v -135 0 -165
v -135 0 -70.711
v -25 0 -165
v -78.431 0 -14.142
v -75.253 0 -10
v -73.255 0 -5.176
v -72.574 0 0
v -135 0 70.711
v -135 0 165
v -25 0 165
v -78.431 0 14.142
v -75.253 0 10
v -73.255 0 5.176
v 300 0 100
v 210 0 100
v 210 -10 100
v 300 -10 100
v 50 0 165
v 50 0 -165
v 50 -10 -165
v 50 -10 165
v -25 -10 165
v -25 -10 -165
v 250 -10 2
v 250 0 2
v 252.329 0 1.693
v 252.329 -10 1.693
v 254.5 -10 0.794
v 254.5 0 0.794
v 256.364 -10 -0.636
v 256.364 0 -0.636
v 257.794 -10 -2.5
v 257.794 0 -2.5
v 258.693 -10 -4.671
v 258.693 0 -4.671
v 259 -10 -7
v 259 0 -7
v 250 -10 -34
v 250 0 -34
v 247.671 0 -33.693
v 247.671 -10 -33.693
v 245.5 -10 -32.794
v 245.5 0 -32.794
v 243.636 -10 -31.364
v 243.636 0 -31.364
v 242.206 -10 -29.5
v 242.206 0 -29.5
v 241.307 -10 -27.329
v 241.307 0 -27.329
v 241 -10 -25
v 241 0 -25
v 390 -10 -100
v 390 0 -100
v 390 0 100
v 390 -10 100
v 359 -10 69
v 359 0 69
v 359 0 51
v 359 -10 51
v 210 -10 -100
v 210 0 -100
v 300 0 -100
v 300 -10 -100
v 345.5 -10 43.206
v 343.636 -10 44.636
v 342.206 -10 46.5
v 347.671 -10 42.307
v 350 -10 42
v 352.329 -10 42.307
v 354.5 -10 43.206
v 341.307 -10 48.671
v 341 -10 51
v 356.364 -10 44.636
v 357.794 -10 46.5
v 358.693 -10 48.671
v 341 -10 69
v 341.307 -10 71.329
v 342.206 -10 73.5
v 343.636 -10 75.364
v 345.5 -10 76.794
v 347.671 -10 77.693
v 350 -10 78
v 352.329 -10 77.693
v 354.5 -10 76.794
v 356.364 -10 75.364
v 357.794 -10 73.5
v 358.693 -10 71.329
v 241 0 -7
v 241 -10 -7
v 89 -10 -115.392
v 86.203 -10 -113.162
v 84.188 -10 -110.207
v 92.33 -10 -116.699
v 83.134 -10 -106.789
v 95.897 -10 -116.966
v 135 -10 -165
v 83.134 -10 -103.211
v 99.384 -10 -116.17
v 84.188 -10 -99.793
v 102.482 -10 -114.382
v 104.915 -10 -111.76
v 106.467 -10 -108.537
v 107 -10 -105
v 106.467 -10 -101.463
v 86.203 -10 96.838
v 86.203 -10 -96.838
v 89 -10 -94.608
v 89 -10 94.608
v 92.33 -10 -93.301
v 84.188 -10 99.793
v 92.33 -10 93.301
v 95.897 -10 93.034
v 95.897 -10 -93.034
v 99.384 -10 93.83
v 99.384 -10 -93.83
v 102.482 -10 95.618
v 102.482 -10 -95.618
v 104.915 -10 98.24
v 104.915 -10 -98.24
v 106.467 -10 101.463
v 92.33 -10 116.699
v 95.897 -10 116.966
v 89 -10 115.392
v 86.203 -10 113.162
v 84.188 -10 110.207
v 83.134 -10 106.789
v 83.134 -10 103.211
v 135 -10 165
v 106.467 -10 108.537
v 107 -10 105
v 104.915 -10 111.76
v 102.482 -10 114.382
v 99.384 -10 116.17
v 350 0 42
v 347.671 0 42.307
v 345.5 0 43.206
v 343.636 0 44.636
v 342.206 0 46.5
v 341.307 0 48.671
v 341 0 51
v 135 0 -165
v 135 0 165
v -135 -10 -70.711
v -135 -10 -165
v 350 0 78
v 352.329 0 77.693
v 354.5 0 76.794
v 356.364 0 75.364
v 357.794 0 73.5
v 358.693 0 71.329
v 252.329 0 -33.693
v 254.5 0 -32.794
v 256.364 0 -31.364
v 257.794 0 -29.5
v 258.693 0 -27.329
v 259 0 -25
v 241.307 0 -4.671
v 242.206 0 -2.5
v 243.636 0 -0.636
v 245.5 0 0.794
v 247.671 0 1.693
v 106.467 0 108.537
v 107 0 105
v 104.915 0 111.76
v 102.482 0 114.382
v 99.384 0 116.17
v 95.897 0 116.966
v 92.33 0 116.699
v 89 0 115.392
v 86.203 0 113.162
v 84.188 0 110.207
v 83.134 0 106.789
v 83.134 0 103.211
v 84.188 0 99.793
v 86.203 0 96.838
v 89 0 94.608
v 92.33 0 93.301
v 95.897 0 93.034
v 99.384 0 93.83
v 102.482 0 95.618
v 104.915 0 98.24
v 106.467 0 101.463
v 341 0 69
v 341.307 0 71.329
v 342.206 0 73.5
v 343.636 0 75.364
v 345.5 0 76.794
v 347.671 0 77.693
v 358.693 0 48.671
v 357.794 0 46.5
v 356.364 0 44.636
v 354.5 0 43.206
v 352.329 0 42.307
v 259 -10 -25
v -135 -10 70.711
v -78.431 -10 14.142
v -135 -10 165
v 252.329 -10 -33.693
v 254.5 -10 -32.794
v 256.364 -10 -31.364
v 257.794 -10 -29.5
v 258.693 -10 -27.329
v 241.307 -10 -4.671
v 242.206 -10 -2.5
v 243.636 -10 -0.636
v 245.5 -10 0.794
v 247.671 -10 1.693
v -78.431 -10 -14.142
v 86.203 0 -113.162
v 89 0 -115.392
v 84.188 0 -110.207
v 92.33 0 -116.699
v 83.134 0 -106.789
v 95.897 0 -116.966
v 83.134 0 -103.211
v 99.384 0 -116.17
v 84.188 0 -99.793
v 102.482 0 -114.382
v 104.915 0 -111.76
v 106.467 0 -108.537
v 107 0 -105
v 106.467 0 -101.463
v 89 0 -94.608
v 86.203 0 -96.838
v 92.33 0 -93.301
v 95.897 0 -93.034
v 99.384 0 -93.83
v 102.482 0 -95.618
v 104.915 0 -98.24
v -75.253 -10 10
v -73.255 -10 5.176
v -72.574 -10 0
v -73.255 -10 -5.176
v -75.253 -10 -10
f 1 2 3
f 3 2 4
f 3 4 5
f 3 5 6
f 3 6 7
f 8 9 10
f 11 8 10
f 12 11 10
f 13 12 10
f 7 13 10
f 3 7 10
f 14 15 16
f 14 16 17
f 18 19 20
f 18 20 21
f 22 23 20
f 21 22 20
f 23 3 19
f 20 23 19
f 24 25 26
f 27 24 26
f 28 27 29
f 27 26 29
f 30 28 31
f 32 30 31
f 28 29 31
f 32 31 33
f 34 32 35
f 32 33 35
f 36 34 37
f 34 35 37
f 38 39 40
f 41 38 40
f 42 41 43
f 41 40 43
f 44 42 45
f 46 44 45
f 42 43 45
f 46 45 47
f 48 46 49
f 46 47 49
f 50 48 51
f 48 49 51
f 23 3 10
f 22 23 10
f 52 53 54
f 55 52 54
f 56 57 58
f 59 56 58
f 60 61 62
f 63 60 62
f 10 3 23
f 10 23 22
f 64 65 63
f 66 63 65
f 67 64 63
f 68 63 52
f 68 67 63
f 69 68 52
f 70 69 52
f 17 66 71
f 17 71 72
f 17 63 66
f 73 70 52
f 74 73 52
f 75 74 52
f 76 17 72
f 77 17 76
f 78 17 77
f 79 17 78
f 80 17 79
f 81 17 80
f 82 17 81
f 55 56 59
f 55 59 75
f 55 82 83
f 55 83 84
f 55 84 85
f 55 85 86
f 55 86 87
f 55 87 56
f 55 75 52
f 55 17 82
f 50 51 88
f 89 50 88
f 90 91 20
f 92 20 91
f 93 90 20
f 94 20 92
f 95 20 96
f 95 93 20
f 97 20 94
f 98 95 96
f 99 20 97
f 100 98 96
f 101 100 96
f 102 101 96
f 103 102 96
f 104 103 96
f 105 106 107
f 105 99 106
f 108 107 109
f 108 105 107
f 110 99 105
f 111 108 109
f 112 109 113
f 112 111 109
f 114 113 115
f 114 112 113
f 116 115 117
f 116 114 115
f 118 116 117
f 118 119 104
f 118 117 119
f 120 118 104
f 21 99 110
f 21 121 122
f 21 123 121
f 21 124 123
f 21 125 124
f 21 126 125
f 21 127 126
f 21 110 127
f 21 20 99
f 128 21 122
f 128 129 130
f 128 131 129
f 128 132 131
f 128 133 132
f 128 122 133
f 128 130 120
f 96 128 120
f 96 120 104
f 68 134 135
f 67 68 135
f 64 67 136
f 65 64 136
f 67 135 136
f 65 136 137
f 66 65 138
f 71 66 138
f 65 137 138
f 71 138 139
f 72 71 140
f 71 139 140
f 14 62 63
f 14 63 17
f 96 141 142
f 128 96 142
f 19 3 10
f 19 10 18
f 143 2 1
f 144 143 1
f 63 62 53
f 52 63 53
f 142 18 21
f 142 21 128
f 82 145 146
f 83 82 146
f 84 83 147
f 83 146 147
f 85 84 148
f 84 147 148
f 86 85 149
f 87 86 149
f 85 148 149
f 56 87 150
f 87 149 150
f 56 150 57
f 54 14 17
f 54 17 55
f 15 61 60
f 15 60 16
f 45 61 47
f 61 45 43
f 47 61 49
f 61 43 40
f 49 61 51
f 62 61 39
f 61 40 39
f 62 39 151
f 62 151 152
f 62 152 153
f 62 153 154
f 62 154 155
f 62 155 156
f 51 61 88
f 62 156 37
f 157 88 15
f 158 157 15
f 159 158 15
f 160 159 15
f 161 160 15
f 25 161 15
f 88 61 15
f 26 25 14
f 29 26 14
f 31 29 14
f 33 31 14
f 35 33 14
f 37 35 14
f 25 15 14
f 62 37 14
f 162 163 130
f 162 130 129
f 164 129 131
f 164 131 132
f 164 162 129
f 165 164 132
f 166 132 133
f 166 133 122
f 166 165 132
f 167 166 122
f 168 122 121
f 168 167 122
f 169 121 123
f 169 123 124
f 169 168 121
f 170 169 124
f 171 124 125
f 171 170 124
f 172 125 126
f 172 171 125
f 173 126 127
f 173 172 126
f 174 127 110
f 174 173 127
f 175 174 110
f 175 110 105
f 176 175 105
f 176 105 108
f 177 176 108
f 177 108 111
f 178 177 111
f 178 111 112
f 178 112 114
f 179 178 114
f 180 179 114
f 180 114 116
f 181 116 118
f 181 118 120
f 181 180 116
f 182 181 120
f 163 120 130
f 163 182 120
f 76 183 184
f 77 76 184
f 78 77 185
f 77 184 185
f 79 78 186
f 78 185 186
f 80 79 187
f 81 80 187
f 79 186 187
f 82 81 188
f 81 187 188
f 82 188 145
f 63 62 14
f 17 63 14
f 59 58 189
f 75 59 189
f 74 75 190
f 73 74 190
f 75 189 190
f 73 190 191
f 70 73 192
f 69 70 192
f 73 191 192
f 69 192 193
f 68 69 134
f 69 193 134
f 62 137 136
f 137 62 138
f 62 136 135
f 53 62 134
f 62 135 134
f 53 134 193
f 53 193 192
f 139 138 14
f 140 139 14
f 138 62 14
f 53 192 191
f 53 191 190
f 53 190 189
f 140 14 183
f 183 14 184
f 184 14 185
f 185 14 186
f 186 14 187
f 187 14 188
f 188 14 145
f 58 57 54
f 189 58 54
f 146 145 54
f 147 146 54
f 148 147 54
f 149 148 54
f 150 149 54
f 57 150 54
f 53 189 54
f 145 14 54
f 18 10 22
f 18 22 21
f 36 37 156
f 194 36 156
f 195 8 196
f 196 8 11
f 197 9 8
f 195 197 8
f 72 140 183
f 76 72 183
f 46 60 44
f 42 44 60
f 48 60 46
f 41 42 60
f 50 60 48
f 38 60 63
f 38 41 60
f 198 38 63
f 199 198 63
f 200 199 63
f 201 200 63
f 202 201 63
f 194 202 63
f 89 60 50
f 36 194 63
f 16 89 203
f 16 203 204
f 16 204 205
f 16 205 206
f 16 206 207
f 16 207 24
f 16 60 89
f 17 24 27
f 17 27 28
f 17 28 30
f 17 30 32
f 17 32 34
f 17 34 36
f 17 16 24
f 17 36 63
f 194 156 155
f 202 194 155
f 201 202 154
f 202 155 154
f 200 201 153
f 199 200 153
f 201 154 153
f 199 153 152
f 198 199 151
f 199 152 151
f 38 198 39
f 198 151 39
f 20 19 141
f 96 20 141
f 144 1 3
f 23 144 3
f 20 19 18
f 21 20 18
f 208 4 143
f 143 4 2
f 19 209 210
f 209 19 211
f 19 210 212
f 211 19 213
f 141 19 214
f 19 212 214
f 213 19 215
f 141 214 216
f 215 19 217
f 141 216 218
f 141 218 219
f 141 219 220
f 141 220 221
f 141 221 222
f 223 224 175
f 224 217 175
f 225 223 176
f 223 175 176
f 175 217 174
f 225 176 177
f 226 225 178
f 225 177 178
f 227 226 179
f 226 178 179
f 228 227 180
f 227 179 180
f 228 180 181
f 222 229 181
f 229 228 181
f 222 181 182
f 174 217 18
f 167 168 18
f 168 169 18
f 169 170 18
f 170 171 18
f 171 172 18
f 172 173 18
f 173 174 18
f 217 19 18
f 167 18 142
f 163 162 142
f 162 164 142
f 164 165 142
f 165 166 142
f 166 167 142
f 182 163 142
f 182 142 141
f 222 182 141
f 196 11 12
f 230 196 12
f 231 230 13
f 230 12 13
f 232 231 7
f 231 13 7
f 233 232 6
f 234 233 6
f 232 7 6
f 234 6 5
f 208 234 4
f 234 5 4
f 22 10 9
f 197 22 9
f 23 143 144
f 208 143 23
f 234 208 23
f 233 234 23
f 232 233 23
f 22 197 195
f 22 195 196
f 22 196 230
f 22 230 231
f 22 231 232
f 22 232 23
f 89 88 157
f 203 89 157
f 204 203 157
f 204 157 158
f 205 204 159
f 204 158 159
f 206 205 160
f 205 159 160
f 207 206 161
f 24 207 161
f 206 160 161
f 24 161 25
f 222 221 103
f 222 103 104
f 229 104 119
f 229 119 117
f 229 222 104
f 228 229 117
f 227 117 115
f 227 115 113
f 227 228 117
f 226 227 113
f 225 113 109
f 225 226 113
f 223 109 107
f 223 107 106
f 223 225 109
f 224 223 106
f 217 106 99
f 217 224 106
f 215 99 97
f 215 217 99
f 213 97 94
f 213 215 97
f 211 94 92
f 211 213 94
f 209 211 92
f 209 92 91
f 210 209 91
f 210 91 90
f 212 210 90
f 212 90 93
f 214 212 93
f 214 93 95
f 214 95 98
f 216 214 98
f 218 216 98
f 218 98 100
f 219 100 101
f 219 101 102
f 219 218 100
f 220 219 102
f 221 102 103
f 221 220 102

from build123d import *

# Parameters (mm, degrees)
F0_W     = 90
F0_H     = 200
F1_DEPTH = 10
F0_W_2   = 85
F0_H_2   = 330
F0_R     = 12
F2_DEPTH = 10
F0_W_3   = 75
F3_DEPTH = 10


with BuildPart() as f1:
    # F0 (on Front) → F1 (new body)
    with BuildSketch(Plane.XZ):
        with BuildLine():
            Line((-25, -165), (-25, 165))
            Line((-25, 165), (-135, 165))
            Line((-135, 165), (-135, 70.710678))
            Line((-135, 70.710678), (-78.431458, 14.142136))
            ThreePointArc((-78.431458, 14.142136), (-72.573593, 0), (-78.431458, -14.142136))
            Line((-78.431458, -14.142136), (-135, -70.710678))
            Line((-135, -70.710678), (-135, -165))
            Line((-135, -165), (-25, -165))
        make_face()
        with Locations((255, 0)):
            Rectangle(F0_W, F0_H)
        Polygon((250, 2), (259, 2), (259, -7), (259, -25), (259, -34), (250, -34), (241, -34), (241, -25), (241, -7), (241, 2), align=None, mode=Mode.SUBTRACT)
        with BuildLine():
            Line((259, -34), (259, -25))
            ThreePointArc((259, -25), (256.363961, -31.363961), (250, -34))
            Line((250, -34), (259, -34))
        make_face()
        with BuildLine():
            Line((259, -7), (259, 2))
            Line((259, 2), (250, 2))
            ThreePointArc((250, 2), (256.363961, -0.636039), (259, -7))
        make_face()
        with BuildLine():
            ThreePointArc((241, -7), (243.636039, -0.636039), (250, 2))
            Line((250, 2), (241, 2))
            Line((241, 2), (241, -7))
        make_face()
        with BuildLine():
            ThreePointArc((250, -34), (243.636039, -31.363961), (241, -25))
            Line((241, -25), (241, -34))
            Line((241, -34), (250, -34))
        make_face()
    extrude(amount=F1_DEPTH)


with BuildPart() as f2:
    # F0 (on Front) → F2 (new body)
    with BuildSketch(Plane.XZ):
        with Locations((92.5, 0)):
            Rectangle(F0_W_2, F0_H_2)
        with Locations((95, -105)):
            Circle(F0_R, mode=Mode.SUBTRACT)
        with Locations((95, 105)):
            Circle(F0_R, mode=Mode.SUBTRACT)
        with Locations((345, 0)):
            Rectangle(F0_W, F0_H)
        Polygon((350, 78), (359, 78), (359, 69), (359, 51), (359, 42), (350, 42), (341, 42), (341, 51), (341, 69), (341, 78), align=None, mode=Mode.SUBTRACT)
        with BuildLine():
            ThreePointArc((341, 69), (343.636039, 75.363961), (350, 78))
            Line((350, 78), (341, 78))
            Line((341, 78), (341, 69))
        make_face()
        with BuildLine():
            Line((359, 69), (359, 78))
            Line((359, 78), (350, 78))
            ThreePointArc((350, 78), (356.363961, 75.363961), (359, 69))
        make_face()
        with BuildLine():
            Line((359, 42), (359, 51))
            ThreePointArc((359, 51), (356.363961, 44.636039), (350, 42))
            Line((350, 42), (359, 42))
        make_face()
        with BuildLine():
            ThreePointArc((350, 42), (343.636039, 44.636039), (341, 51))
            Line((341, 51), (341, 42))
            Line((341, 42), (350, 42))
        make_face()
    extrude(amount=F2_DEPTH)


with BuildPart() as f3:
    # F0 (on Front) → F3 (new body)
    with BuildSketch(Plane.XZ):
        with Locations((12.5, 0)):
            Rectangle(F0_W_3, F0_H_2)
    extrude(amount=F3_DEPTH)


solid = Compound([f1.part, f2.part, f3.part])
